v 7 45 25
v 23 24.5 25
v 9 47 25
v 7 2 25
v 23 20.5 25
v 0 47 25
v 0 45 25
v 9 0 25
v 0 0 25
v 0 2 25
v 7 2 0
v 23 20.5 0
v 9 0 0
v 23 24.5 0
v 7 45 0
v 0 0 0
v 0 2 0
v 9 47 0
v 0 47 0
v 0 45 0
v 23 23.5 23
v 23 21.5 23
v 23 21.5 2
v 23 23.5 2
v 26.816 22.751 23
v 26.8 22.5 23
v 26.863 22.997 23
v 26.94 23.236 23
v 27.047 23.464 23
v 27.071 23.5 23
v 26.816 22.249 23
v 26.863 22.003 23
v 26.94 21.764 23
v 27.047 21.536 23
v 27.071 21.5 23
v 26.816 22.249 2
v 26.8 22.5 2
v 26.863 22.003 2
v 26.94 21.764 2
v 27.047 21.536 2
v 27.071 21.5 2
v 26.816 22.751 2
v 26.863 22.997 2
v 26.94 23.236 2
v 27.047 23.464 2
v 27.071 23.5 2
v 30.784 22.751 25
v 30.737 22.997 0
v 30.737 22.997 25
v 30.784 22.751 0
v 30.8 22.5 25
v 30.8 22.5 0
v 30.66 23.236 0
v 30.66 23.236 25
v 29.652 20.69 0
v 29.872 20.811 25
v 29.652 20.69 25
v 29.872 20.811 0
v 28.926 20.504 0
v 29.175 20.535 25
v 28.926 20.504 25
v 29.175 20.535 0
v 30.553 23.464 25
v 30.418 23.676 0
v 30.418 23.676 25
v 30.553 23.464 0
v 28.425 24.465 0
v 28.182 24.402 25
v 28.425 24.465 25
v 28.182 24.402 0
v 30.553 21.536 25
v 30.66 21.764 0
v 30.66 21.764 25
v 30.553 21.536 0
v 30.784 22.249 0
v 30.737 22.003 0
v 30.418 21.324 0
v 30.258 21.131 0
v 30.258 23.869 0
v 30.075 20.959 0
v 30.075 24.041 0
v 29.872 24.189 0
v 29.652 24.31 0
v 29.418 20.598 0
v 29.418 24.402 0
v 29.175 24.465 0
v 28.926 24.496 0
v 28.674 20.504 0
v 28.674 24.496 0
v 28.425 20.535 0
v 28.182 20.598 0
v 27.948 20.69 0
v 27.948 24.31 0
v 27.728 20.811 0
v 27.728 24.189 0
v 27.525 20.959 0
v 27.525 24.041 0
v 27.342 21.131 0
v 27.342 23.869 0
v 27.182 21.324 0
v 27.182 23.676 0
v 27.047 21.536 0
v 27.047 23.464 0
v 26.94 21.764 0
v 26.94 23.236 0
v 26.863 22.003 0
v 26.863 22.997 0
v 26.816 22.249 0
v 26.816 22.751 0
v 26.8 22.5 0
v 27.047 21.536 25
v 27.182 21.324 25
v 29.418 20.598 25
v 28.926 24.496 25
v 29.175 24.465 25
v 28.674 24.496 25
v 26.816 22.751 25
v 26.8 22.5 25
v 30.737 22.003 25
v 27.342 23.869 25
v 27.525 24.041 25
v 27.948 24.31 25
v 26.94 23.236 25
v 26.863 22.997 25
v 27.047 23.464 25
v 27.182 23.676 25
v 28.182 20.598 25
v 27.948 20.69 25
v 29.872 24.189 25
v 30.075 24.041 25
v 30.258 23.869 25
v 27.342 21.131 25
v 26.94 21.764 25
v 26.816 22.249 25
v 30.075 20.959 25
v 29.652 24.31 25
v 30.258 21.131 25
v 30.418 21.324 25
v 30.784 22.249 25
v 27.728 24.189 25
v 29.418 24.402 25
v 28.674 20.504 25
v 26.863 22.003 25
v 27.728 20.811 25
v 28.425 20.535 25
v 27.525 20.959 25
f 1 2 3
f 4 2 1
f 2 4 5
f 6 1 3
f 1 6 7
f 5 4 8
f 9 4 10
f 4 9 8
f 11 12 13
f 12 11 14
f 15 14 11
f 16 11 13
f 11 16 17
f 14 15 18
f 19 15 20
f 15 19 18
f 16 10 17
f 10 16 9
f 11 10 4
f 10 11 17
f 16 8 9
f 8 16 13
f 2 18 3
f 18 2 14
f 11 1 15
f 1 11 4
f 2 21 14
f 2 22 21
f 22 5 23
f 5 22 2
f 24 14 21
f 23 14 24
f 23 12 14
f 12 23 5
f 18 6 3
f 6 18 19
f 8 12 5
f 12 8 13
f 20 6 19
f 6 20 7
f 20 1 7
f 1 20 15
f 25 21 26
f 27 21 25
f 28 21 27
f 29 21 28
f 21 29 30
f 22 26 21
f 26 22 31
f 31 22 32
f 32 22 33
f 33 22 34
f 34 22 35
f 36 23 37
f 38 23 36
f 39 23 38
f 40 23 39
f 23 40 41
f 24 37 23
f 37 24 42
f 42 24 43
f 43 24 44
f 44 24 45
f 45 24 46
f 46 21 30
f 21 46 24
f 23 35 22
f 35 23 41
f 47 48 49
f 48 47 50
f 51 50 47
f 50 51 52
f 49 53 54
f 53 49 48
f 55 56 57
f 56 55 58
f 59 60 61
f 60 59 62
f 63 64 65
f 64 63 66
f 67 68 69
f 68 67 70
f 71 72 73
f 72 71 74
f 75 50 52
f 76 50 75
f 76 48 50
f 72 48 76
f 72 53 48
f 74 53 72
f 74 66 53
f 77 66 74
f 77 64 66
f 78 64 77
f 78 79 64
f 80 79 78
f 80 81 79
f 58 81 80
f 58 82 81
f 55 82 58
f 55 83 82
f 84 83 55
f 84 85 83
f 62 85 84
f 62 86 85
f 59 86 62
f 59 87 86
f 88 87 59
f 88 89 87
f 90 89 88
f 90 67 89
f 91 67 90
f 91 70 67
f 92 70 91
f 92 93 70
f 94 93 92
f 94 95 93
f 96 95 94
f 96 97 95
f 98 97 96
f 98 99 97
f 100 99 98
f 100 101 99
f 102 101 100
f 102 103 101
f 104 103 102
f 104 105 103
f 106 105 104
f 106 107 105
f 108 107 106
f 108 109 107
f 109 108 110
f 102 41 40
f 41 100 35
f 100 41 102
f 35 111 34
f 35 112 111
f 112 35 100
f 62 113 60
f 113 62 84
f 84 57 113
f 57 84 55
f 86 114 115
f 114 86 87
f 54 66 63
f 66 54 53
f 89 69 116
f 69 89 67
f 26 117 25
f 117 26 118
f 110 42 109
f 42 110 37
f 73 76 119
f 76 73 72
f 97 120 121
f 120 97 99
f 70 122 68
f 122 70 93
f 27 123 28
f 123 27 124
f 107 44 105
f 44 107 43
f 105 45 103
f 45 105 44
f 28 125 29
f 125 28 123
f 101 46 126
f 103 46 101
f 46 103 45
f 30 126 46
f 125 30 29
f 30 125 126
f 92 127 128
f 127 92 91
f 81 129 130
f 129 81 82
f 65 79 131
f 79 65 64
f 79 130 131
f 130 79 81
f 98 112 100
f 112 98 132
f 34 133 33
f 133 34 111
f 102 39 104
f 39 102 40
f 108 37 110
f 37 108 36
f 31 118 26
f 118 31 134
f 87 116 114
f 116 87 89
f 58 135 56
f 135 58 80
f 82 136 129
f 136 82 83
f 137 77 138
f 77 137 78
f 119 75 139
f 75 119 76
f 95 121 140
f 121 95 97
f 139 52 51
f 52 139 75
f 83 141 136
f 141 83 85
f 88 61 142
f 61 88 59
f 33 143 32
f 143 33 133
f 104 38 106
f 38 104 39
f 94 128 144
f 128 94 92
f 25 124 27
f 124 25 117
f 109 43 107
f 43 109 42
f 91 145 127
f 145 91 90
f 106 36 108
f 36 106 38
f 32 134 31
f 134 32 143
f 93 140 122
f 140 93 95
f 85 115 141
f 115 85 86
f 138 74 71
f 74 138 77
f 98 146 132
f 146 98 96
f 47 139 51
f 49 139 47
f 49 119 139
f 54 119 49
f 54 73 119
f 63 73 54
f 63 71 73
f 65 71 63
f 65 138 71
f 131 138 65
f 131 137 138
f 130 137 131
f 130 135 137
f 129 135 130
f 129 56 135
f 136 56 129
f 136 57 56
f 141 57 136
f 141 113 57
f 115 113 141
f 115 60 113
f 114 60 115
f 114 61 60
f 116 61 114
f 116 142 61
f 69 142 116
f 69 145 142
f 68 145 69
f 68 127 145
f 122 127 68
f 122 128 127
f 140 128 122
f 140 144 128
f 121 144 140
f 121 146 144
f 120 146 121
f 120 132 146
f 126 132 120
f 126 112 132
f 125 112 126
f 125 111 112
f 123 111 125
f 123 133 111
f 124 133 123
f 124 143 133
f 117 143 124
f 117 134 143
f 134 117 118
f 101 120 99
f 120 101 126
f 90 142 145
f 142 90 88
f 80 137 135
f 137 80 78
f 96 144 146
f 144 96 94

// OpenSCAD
displayThickness = 43;
displayTop = 7;
webcamBaseMax = 25;
webcamBaseMin = 21;
webcamThickness = 3.8;

height=14;

cube([displayTop+2, 2, webcamBaseMax]);
hull() {
    translate([displayTop,0,0]) {
        cube([2, displayThickness+2+2, webcamBaseMax]);
    }
    translate([displayTop+height,(displayThickness+2)/2-2,0]) {
        cube([2, 4, webcamBaseMax]);
    }
}
translate([0,displayThickness+2,0]) {
    cube([displayTop+2, 2, webcamBaseMax]);
}
translate([displayTop+height+1,(displayThickness+2)/2-1,(webcamBaseMax-webcamBaseMin)/2]) {
    cube([webcamThickness+2,2,webcamBaseMin]);
}

translate([displayTop+webcamThickness+height+4,(displayThickness+2)/2,0]) {
    cylinder(r=2, h=webcamBaseMax, $fn=50);
}
